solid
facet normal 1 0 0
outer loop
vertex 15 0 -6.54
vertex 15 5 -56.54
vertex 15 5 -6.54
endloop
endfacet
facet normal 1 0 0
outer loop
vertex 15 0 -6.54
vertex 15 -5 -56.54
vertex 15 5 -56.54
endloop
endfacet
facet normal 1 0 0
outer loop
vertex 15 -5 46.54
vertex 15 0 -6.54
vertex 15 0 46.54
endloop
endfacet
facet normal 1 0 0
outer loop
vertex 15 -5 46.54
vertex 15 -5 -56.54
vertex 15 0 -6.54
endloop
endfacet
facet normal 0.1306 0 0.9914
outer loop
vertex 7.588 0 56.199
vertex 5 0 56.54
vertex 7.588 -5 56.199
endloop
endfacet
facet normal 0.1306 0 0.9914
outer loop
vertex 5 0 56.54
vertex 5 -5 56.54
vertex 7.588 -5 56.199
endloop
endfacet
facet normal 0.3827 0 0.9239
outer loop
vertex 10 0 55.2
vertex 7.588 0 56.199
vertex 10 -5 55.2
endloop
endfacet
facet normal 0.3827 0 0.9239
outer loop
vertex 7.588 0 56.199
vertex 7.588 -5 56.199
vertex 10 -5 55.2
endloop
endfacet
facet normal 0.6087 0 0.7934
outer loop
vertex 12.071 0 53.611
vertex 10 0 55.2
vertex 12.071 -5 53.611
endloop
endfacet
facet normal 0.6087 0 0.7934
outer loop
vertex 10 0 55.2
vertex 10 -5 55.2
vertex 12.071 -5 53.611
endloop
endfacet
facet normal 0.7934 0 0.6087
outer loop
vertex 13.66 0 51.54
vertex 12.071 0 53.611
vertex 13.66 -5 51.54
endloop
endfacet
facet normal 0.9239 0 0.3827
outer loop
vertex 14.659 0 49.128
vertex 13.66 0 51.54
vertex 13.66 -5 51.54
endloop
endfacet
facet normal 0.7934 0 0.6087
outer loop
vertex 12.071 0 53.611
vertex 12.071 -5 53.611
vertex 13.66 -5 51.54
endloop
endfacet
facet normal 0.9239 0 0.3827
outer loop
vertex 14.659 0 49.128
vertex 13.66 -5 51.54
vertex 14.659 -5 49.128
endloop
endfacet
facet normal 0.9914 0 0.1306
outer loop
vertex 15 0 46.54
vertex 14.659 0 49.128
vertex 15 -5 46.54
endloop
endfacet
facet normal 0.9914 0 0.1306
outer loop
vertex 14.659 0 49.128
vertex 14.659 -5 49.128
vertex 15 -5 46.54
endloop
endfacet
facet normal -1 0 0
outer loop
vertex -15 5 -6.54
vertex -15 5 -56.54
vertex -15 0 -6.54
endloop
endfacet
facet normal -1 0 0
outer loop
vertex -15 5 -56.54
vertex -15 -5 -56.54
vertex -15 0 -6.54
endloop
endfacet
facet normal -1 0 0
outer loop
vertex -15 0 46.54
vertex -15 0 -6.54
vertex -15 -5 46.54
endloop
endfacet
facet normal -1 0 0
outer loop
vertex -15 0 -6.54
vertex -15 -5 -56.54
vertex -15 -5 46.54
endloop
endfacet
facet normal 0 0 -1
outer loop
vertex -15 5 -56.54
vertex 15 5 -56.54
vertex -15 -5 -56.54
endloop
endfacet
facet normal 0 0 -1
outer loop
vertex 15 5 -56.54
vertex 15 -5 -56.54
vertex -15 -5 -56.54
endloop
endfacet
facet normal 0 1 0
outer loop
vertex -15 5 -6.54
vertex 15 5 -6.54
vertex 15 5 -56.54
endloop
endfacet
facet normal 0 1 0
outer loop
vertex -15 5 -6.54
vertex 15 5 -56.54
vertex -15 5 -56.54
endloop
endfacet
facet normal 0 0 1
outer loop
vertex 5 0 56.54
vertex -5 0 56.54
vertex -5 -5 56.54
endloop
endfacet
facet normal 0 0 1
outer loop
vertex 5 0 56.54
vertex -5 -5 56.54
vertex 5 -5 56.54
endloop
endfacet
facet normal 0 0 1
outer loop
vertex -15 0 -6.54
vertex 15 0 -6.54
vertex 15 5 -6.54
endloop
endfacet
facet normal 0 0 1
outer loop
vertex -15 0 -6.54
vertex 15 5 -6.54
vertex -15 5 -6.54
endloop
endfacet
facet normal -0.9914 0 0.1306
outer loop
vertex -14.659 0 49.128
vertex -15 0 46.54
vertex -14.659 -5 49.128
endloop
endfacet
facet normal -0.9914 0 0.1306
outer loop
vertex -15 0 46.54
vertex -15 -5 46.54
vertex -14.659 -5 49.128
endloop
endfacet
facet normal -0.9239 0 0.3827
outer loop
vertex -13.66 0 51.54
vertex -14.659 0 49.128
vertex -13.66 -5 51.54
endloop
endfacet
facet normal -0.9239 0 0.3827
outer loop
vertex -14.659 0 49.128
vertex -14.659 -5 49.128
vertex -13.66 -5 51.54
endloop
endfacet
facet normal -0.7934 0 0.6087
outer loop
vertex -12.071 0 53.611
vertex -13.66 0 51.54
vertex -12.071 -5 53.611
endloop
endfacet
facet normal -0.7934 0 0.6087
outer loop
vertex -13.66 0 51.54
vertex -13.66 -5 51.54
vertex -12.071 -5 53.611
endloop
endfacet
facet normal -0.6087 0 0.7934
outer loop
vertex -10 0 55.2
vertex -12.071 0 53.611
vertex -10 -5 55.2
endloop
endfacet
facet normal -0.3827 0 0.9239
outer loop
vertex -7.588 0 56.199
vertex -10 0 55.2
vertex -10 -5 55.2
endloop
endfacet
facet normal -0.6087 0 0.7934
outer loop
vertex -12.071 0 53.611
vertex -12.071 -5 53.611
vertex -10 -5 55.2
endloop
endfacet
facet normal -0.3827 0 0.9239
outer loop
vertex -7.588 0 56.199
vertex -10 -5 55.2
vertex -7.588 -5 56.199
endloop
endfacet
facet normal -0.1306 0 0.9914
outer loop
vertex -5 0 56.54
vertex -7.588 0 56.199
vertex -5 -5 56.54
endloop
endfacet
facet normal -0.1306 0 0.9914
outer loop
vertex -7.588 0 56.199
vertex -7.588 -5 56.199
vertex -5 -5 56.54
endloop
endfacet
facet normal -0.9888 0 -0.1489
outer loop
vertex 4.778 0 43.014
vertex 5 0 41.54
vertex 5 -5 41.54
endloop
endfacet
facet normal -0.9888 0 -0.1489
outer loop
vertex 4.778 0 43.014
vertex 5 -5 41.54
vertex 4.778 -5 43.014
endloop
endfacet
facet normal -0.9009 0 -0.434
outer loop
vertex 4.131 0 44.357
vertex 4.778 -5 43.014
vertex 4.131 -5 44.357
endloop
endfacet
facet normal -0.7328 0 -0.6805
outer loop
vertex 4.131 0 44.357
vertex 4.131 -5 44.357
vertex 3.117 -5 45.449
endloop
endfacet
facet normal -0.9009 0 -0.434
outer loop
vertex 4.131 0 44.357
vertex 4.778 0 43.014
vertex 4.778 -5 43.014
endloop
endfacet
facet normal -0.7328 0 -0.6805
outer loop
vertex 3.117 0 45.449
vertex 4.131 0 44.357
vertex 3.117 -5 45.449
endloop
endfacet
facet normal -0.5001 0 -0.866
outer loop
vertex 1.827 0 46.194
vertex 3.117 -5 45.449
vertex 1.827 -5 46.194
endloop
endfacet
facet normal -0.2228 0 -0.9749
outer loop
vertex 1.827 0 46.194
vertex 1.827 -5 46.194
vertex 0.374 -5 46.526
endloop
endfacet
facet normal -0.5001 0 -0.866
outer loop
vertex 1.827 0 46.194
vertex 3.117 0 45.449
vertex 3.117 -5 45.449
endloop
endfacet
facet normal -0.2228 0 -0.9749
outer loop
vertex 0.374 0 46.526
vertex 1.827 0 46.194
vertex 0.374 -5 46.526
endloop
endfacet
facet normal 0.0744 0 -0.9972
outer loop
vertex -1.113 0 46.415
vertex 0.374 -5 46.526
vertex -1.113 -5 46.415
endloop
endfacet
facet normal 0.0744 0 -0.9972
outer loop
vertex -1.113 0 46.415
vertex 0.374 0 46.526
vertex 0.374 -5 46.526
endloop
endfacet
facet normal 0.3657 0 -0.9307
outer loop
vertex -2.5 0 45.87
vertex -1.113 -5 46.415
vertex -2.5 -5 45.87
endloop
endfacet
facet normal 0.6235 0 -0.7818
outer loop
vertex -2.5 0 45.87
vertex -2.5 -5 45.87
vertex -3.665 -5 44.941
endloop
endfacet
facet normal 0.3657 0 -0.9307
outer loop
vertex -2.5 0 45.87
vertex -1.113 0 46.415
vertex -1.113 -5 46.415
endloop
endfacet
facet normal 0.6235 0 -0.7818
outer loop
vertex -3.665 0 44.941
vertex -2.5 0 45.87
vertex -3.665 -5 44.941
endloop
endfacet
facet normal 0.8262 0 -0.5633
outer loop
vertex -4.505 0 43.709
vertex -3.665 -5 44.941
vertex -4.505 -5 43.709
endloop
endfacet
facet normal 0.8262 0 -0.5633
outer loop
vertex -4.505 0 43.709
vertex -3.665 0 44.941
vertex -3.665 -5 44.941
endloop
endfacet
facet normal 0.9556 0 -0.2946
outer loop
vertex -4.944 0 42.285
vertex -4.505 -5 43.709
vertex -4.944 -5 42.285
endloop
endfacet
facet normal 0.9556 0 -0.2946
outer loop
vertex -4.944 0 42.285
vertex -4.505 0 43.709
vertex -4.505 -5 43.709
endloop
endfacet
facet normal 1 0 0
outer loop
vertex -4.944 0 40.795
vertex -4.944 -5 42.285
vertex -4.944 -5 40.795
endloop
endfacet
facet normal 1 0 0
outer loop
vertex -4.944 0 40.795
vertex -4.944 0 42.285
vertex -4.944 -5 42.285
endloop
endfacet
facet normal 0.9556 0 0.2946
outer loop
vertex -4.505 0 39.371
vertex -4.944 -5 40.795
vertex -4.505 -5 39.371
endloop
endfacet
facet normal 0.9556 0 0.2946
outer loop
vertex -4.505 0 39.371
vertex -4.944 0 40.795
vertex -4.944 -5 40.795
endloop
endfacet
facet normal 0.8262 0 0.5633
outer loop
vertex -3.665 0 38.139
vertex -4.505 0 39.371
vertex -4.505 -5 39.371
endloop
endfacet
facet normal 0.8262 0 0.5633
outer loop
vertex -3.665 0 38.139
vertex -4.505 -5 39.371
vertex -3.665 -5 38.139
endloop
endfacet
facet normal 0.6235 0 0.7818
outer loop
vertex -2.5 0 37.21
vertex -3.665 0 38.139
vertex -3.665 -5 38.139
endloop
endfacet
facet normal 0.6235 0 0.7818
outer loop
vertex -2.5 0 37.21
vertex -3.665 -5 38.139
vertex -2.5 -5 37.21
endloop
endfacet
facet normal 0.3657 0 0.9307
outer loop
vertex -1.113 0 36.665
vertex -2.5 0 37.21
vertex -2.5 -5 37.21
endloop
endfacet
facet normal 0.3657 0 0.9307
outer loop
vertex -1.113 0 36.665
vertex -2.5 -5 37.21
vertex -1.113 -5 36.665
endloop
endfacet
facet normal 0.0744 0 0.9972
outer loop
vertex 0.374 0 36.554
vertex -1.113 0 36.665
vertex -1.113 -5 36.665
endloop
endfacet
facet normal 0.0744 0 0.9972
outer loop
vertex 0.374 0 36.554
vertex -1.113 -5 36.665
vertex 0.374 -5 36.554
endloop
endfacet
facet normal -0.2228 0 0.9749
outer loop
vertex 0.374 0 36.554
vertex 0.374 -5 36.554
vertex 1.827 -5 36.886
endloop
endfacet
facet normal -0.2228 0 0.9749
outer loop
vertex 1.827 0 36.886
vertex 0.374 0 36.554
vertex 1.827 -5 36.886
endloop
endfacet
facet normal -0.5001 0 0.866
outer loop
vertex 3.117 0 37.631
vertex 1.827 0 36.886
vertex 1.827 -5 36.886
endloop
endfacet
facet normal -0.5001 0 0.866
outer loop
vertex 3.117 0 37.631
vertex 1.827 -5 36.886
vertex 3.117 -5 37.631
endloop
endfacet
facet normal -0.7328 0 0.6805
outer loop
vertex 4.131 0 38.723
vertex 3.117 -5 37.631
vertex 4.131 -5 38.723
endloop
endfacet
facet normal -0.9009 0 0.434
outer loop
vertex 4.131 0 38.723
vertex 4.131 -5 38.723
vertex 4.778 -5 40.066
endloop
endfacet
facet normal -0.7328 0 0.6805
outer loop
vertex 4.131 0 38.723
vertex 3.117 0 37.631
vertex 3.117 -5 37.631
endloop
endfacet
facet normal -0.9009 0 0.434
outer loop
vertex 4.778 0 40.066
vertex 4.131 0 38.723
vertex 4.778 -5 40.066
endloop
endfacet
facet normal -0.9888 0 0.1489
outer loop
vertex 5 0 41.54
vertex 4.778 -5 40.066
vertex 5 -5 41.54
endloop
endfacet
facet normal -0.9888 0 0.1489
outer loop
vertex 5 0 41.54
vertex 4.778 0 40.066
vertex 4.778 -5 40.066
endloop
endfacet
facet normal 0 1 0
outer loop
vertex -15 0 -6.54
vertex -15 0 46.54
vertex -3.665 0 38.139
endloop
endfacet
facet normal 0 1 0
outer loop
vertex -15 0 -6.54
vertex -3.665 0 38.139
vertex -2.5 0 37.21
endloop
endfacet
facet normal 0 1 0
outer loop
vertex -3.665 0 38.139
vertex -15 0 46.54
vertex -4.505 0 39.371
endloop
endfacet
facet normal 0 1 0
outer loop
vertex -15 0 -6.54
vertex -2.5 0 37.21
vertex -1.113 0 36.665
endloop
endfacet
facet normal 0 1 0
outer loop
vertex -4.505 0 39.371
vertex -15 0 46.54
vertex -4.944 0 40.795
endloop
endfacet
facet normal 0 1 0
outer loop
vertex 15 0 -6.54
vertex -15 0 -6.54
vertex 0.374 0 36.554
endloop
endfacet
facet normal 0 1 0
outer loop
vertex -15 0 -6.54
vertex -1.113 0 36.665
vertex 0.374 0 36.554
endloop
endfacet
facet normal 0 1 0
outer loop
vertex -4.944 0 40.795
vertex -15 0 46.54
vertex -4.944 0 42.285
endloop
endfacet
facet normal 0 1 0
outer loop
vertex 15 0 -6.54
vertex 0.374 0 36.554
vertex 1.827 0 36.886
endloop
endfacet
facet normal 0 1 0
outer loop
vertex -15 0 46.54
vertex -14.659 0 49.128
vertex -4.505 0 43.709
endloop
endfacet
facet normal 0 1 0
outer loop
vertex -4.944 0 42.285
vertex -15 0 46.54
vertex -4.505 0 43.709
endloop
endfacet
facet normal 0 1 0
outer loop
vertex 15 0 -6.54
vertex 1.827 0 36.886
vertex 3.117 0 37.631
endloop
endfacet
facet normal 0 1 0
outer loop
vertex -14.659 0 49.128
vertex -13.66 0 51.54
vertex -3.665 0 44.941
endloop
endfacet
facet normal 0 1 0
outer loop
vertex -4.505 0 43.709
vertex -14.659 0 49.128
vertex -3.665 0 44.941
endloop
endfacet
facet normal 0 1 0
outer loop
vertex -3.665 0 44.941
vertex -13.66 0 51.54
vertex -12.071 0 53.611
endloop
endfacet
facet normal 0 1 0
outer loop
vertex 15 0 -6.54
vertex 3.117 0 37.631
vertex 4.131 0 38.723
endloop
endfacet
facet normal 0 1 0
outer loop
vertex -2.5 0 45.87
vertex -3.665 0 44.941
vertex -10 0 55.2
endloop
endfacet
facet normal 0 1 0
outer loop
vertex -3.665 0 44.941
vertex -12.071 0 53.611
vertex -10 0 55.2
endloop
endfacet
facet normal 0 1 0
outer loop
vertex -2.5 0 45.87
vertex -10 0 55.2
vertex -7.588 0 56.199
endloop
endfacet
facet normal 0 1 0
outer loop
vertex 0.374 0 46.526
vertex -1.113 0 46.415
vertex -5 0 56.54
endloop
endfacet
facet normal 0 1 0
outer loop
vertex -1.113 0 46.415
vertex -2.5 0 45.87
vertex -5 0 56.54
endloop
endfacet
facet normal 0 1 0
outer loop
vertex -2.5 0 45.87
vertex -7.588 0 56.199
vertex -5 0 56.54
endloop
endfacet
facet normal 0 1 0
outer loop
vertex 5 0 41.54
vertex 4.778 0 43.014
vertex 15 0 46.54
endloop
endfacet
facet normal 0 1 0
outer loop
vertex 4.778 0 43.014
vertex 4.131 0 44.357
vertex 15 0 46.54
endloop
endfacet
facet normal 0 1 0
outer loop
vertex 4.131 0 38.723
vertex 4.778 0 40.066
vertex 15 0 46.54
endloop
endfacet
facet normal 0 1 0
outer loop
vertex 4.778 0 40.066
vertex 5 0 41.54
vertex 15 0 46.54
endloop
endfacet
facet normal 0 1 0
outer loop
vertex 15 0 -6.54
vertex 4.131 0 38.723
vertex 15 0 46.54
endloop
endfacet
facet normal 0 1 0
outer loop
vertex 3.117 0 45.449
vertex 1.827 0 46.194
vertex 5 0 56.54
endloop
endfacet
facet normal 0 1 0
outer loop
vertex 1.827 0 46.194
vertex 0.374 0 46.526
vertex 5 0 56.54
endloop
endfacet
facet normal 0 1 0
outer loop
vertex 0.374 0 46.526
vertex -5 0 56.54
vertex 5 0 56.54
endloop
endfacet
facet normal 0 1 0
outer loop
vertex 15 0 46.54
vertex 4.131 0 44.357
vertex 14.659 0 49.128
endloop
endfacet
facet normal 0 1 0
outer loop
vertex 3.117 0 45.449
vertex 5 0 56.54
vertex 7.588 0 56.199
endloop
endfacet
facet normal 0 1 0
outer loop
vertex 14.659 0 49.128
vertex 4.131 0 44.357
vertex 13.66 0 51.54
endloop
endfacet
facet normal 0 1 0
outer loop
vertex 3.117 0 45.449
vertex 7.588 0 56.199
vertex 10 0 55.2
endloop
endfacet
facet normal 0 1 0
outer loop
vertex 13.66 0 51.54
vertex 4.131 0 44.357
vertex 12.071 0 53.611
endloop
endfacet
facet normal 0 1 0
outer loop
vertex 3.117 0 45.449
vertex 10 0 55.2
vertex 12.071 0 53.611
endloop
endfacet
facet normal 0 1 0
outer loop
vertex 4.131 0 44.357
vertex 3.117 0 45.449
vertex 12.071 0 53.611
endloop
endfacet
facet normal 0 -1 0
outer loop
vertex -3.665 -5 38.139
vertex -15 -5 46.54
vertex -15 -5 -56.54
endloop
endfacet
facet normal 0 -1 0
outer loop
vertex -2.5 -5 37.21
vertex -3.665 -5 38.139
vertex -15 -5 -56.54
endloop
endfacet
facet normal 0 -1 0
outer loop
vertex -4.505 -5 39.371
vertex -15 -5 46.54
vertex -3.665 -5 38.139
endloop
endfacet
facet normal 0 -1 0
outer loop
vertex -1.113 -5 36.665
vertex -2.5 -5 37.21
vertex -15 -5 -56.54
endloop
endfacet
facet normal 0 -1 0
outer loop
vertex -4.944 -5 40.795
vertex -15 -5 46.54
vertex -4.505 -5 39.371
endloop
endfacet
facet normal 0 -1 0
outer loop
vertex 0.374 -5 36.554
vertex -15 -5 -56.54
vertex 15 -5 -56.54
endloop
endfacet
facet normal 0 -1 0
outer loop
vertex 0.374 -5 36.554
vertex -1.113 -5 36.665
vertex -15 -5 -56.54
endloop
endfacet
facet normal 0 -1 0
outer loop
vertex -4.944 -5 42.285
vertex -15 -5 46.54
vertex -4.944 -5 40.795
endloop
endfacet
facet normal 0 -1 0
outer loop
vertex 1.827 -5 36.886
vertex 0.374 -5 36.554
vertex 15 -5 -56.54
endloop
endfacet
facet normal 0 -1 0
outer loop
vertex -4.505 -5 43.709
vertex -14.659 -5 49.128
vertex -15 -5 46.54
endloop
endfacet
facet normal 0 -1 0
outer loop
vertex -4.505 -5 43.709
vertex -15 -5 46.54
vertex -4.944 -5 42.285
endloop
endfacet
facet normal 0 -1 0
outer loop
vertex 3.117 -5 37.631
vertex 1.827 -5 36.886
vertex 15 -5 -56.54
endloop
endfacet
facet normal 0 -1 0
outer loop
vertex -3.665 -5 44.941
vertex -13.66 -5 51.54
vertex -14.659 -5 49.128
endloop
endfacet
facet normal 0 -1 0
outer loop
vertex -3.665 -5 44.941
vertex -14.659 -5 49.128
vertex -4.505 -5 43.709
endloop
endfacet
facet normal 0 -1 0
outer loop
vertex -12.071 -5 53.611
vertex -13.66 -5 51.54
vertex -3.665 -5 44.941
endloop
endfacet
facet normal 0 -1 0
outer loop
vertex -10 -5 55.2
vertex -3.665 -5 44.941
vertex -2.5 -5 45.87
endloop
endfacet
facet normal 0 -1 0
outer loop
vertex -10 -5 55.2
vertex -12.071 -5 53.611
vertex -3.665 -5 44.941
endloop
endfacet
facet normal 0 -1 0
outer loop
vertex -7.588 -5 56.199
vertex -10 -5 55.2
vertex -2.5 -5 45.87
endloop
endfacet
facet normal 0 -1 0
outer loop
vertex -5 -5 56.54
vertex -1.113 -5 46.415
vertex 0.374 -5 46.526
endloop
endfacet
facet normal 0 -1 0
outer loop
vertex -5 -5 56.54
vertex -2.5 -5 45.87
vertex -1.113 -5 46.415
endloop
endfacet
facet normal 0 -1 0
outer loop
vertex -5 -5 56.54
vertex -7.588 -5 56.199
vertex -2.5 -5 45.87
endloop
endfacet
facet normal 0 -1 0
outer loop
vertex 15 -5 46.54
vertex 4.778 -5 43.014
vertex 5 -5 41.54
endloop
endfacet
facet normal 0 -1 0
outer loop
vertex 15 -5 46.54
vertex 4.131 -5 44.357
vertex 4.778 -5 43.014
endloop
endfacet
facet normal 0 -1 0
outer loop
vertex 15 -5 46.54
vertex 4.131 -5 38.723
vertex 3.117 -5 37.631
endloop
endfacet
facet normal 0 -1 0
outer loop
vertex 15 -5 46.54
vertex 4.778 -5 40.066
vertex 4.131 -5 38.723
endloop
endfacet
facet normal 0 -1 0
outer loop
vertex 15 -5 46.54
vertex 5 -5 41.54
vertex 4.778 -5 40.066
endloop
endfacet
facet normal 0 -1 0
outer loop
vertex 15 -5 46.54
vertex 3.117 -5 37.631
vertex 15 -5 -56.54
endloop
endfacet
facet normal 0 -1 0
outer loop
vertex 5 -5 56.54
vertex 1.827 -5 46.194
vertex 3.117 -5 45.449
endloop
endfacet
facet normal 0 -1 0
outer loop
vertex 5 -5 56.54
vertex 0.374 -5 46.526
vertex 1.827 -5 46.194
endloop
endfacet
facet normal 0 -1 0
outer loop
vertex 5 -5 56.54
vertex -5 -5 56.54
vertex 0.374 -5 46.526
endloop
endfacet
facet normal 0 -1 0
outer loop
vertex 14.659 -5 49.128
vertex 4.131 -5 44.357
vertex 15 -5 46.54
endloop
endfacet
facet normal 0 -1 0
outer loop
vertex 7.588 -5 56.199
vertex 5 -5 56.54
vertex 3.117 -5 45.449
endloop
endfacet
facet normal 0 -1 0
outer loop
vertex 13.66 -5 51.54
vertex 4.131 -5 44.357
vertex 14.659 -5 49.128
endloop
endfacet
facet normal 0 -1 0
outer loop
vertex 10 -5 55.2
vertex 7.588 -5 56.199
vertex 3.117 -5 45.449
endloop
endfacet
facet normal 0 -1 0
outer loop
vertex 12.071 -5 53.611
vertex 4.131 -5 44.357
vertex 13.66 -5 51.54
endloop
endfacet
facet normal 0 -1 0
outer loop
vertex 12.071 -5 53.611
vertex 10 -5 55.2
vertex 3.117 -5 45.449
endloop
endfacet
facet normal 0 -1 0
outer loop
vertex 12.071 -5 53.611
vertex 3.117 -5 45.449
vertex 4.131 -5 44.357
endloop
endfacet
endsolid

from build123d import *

# Parameters (mm, degrees)
F0_W     = 30
F0_H     = 113.08
F0_R     = 5
F1_DEPTH = 5
F2_R     = 10
F3_W     = 30
F3_H     = 50
F4_DEPTH = 5


with BuildPart() as f1:
    # F0 (on Front) → F1 (new body)
    with BuildSketch(Plane.XZ):
        Rectangle(F0_W, F0_H)
        with Locations((0, 41.54)):
            Circle(F0_R, mode=Mode.SUBTRACT)
    extrude(amount=F1_DEPTH)

    # F2
    f2_edges = [f1.edges().sort_by_distance(p)[0] for p in [
        (15, -2.5, 56.54),
        (-15, -2.5, 56.54),
    ]]
    fillet(f2_edges, radius=F2_R)

    # F3 (on face) → F4 (join)
    with BuildSketch(Plane(origin=(0, 0, 0), x_dir=(-1, 0, 0), z_dir=(0, 1, 0))):
        with Locations((0, -31.54)):
            Rectangle(F3_W, F3_H)
    extrude(amount=F4_DEPTH)


solid = f1.part
